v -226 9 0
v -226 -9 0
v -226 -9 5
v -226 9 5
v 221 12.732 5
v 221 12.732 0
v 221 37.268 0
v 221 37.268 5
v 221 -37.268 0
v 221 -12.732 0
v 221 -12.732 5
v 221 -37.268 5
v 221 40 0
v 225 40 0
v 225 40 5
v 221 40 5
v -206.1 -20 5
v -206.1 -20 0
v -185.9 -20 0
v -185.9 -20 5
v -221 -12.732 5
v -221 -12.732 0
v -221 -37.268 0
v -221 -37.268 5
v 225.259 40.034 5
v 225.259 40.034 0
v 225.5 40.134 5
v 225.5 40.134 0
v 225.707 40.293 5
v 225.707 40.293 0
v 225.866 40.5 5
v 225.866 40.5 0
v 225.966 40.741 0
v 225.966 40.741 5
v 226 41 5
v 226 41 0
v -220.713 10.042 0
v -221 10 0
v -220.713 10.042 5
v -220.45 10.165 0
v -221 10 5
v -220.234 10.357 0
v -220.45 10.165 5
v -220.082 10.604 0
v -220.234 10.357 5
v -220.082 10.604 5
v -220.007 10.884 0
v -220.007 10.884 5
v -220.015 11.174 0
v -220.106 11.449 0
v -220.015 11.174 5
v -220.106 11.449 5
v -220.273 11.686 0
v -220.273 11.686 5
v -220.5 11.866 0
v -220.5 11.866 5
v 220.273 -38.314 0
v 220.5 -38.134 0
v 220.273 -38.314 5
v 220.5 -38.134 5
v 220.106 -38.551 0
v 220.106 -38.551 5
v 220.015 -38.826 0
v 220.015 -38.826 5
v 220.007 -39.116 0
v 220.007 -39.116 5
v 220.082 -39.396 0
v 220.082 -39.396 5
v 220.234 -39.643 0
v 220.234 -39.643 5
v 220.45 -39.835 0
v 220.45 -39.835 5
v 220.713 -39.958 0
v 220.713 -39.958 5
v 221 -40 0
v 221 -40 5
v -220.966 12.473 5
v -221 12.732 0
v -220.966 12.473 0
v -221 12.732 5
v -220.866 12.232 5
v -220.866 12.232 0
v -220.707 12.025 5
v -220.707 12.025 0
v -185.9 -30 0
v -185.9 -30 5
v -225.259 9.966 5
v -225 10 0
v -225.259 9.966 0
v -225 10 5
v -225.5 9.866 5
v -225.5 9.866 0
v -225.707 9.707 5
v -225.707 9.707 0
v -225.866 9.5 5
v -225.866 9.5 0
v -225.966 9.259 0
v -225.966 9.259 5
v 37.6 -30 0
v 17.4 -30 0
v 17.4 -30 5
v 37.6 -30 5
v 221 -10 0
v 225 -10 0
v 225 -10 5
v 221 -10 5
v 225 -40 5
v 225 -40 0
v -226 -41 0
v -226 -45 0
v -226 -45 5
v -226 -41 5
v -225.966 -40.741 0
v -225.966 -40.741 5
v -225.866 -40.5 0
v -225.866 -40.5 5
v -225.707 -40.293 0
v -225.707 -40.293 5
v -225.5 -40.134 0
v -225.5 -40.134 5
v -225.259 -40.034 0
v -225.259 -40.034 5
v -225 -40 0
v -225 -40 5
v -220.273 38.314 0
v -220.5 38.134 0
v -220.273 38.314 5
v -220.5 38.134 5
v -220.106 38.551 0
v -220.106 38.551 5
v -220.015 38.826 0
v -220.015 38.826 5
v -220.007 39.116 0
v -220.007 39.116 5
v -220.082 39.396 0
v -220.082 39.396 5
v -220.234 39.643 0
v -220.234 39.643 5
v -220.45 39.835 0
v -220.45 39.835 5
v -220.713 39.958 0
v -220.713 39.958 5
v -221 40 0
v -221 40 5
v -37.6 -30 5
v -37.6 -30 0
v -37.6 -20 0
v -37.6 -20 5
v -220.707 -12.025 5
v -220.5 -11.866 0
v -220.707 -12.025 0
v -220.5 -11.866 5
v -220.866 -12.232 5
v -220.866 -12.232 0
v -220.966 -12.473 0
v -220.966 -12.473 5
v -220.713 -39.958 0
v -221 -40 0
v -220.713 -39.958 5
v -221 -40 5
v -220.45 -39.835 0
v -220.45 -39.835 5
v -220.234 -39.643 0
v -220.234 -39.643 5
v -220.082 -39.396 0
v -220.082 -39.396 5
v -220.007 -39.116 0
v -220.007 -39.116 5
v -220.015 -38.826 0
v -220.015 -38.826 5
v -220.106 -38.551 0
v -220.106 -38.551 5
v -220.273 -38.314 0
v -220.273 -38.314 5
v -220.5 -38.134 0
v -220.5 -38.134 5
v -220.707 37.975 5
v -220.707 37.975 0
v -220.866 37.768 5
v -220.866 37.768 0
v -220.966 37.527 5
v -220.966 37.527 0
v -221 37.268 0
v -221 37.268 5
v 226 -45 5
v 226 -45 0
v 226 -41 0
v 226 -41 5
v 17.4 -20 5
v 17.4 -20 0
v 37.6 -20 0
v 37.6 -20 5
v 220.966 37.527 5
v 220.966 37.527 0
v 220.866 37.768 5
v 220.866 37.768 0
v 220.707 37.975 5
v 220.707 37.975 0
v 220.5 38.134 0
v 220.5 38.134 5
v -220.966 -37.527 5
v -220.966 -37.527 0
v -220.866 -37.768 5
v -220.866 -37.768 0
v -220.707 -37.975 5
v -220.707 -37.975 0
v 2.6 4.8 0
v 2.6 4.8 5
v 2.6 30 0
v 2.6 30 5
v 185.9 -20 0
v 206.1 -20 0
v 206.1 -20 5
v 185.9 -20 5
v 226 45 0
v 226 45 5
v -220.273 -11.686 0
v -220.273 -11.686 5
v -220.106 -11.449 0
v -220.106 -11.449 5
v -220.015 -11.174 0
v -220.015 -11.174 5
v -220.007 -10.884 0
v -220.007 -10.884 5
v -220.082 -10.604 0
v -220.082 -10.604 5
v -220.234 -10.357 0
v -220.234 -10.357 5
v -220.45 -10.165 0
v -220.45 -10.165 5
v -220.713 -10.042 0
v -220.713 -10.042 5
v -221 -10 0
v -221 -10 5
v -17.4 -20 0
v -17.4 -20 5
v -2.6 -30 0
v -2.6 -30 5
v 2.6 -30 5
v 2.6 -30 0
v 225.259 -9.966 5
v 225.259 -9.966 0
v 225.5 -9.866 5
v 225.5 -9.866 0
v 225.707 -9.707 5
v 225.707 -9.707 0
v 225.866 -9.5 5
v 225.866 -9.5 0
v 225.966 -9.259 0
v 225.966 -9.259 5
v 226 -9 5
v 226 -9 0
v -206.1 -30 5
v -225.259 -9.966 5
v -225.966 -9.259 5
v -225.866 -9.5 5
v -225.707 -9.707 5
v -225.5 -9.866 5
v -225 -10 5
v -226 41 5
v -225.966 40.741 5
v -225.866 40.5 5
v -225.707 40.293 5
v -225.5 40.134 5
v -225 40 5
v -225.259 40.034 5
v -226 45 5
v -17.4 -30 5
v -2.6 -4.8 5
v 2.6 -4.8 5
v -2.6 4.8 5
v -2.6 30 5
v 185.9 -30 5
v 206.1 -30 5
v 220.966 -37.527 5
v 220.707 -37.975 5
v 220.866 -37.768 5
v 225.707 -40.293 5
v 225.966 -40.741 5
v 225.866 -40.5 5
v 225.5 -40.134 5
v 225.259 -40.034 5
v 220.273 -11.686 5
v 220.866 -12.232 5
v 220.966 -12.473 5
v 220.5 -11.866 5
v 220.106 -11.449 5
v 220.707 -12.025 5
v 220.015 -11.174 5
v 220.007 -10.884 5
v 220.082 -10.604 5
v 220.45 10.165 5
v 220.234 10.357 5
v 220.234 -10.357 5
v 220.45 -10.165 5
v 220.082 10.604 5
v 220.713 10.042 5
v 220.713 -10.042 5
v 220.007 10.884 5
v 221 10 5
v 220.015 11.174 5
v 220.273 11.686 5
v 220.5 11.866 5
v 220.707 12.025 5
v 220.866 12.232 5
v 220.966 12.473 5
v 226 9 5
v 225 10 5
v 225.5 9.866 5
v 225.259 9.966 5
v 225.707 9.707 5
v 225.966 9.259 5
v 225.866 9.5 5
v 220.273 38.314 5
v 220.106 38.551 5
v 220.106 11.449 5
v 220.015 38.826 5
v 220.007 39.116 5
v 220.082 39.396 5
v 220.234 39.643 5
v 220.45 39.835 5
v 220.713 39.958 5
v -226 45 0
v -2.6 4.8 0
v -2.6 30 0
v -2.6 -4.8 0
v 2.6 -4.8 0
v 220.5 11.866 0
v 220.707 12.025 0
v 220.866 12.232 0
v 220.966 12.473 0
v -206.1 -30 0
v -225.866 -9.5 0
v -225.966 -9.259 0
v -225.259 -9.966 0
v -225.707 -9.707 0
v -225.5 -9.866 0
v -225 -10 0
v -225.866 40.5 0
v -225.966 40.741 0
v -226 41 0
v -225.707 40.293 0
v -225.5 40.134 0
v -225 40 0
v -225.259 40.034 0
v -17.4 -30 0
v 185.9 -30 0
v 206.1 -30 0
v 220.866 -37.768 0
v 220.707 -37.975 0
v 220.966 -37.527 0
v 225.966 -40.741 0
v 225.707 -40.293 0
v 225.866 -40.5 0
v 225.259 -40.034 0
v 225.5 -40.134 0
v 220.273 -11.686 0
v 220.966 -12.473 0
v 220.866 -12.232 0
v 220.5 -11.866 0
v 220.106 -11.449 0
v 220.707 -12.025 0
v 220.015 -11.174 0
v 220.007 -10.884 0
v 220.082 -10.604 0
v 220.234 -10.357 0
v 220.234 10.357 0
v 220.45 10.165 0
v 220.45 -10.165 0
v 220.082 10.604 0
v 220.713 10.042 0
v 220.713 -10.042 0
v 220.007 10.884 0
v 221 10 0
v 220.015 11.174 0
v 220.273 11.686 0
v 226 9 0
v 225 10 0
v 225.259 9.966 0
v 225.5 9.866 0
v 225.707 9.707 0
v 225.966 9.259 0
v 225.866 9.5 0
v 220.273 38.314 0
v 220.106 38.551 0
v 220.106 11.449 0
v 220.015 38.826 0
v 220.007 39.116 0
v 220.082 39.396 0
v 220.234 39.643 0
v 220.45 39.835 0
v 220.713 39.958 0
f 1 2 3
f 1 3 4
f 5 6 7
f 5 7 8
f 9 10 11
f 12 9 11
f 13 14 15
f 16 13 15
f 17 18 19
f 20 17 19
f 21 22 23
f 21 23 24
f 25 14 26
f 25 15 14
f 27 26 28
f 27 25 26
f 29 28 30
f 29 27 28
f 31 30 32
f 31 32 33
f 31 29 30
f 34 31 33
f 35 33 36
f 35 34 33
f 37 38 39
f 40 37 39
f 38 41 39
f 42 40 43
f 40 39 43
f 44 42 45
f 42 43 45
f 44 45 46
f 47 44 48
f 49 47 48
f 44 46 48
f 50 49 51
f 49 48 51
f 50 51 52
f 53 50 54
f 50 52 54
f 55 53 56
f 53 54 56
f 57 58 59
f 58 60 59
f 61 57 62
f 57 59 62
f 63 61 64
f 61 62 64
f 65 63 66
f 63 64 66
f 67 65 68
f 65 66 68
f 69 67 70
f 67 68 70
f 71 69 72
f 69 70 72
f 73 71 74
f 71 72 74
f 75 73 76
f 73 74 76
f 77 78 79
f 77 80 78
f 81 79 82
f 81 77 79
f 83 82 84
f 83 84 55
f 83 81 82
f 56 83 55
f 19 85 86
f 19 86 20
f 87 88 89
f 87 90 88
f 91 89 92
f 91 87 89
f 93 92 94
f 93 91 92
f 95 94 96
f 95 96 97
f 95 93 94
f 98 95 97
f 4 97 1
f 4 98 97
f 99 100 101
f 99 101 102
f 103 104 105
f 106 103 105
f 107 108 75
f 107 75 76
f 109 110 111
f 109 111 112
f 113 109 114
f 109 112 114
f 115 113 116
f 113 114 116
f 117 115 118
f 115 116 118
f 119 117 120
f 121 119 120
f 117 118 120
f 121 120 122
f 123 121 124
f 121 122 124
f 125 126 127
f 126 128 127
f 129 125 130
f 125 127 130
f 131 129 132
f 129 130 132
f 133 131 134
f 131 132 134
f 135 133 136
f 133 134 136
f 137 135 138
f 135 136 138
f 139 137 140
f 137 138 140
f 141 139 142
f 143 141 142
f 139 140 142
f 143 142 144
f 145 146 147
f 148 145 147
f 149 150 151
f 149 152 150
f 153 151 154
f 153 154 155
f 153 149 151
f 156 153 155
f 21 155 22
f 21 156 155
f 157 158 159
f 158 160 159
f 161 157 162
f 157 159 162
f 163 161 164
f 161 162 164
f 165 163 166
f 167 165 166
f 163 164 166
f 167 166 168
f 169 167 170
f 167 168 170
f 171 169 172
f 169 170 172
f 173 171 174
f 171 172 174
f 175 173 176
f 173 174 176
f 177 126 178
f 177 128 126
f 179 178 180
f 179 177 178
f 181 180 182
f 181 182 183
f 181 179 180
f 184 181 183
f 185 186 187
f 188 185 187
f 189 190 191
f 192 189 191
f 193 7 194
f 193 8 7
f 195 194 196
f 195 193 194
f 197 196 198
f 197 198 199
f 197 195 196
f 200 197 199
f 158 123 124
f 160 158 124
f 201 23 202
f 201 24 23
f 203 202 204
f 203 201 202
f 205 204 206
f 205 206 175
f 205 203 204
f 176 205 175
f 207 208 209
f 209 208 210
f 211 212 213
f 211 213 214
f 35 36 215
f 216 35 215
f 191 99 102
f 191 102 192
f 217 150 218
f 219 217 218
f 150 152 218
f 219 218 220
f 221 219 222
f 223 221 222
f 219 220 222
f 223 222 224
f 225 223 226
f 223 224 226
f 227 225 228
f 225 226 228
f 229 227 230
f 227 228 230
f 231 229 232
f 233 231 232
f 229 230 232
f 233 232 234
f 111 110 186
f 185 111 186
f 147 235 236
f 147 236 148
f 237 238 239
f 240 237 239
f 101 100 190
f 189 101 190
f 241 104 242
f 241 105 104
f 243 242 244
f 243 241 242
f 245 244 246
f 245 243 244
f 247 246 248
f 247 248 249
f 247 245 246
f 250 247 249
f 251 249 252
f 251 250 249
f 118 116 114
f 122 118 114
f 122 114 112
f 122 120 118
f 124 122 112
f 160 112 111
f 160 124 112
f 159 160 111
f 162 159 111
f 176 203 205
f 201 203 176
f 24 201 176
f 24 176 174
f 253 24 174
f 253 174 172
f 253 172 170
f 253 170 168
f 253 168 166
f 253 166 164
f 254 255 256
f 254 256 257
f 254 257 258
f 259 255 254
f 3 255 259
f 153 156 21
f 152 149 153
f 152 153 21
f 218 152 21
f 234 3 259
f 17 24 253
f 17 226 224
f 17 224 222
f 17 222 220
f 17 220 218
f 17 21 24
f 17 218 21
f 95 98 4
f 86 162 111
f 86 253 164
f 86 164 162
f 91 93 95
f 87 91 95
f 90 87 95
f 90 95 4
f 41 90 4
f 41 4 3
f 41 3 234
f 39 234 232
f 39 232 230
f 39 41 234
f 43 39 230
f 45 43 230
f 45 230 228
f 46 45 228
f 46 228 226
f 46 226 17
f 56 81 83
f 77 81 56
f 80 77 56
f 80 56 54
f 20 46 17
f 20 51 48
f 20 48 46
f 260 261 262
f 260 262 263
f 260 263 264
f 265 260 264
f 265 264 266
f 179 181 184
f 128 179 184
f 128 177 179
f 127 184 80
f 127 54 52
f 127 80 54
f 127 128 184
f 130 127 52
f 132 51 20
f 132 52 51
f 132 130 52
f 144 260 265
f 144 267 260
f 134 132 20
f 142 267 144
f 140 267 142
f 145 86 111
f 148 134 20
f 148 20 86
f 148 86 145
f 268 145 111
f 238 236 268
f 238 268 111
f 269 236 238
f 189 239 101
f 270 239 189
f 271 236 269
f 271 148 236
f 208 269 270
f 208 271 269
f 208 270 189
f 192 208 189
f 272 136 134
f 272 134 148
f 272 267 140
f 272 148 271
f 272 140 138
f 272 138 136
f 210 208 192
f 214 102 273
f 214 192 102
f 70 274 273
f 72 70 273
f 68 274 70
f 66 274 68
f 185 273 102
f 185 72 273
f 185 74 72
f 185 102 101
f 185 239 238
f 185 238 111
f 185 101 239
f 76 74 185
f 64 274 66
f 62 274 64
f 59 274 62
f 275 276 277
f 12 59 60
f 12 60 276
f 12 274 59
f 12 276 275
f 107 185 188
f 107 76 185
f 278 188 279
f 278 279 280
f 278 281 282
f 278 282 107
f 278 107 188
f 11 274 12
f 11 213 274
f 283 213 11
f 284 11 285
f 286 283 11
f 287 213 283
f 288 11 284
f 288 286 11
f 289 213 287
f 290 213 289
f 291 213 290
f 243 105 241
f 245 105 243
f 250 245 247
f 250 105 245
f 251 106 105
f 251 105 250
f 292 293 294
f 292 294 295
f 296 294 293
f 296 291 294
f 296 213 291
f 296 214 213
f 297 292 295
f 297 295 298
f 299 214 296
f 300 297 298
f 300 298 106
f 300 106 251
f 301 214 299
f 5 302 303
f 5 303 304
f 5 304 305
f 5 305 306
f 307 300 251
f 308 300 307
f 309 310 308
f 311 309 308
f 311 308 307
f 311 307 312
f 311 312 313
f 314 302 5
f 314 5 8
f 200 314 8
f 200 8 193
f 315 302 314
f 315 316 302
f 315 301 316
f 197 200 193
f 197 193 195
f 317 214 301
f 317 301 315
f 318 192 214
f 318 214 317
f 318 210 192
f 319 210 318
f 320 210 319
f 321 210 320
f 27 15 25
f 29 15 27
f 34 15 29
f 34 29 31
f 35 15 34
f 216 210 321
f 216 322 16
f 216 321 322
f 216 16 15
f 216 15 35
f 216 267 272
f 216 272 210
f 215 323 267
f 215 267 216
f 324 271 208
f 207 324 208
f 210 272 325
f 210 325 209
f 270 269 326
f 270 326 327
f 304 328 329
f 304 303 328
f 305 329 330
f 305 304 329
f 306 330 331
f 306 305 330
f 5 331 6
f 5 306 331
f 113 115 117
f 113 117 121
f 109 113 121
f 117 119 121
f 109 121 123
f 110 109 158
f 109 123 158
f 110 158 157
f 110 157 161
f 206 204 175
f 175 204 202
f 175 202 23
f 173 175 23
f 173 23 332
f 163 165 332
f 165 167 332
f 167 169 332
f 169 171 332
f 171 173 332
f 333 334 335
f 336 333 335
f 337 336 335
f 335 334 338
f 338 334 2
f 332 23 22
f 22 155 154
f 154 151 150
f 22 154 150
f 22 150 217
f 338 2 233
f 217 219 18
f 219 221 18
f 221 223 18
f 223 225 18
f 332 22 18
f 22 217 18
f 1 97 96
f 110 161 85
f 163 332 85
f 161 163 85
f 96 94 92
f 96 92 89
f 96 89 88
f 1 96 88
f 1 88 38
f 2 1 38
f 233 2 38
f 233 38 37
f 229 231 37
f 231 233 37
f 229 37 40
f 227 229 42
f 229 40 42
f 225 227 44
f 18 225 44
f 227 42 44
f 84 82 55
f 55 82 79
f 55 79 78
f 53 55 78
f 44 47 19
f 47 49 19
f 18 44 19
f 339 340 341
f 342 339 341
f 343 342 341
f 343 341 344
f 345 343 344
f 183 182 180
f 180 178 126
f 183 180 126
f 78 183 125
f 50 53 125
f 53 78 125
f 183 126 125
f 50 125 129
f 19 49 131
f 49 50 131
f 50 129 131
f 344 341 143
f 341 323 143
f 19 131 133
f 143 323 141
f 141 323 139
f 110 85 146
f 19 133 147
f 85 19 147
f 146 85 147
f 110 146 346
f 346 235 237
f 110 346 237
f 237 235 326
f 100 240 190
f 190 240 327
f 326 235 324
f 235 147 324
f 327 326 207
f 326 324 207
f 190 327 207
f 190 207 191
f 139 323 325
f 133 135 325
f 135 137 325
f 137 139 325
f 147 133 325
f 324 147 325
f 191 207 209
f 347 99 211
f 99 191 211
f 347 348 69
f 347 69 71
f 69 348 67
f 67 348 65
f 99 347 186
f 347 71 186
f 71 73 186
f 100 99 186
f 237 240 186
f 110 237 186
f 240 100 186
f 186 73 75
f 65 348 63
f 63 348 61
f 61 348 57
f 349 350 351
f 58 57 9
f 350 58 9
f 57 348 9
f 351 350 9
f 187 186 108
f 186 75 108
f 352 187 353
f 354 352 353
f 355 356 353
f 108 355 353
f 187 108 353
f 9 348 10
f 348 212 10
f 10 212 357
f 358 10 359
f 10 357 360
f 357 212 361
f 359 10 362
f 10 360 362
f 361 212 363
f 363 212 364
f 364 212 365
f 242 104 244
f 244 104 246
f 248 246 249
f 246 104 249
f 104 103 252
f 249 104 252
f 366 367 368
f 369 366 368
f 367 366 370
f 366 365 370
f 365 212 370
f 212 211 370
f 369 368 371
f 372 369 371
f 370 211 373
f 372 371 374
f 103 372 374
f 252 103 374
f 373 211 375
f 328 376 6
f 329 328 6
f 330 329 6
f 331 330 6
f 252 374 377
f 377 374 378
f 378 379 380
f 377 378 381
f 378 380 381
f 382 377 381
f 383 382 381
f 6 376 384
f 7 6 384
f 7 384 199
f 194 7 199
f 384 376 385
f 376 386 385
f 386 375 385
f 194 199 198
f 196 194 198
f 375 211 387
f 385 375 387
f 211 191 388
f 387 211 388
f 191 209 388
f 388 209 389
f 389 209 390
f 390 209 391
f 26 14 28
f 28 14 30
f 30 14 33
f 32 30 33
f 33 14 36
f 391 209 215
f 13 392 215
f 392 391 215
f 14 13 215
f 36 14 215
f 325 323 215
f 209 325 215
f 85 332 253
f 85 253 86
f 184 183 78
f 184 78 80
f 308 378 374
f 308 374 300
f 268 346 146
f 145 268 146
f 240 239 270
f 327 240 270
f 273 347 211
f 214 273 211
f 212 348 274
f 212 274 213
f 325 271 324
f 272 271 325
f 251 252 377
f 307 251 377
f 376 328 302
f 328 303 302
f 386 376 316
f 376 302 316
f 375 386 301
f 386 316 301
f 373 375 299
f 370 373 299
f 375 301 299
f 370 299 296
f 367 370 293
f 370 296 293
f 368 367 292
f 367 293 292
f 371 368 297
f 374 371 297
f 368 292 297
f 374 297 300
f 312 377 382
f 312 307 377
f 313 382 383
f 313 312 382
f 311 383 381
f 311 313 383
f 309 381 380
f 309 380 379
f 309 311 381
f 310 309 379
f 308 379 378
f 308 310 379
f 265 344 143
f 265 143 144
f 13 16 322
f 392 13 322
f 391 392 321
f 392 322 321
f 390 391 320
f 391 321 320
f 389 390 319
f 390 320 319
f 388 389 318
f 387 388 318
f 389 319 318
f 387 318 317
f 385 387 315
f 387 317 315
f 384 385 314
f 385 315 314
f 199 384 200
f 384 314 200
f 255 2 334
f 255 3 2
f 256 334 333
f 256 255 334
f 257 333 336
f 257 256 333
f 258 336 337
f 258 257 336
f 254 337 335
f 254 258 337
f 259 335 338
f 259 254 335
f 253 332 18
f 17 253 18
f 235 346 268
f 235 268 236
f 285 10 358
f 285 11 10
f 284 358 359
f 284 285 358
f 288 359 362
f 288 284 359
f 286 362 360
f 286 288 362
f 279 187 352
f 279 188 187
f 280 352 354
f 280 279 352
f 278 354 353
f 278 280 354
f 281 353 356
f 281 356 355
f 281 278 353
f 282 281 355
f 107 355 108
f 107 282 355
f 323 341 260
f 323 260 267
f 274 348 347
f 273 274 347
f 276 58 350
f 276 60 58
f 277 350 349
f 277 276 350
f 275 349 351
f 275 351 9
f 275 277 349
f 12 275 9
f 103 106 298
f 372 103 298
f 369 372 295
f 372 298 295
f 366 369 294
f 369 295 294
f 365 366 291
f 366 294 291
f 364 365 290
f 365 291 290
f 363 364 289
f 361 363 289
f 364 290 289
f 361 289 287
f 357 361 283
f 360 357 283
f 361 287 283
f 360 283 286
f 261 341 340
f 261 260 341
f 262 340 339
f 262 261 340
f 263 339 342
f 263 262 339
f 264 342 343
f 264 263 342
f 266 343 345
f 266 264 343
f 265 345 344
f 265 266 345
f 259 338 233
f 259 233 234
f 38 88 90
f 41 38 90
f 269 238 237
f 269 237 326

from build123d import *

# Parameters (mm, degrees)
SKETCH1_W           = 452
SKETCH1_H           = 90
BOSS_EXTRUDE1_DEPTH = 5
SKETCH2_W           = 5.2
SKETCH2_H           = 25.2
CUT_EXTRUDE1_DEPTH  = 231.490780727
SKETCH4_W           = 5
SKETCH4_H           = 30
CUT_EXTRUDE5_DEPTH  = 5
SKETCH7_R           = 1
CUT_EXTRUDE6_DEPTH  = 231.490780727
FILLET4_R           = 1
SKETCH8_W           = 20.2
SKETCH8_H           = 10
CUT_EXTRUDE7_DEPTH  = 10
SKETCH9_W           = 20.2
SKETCH9_H           = 10
CUT_EXTRUDE8_DEPTH  = 300


with BuildPart() as part:
    # Sketch1 → Boss-Extrude1 (new body)
    with BuildSketch(Plane.XY):
        Rectangle(SKETCH1_W, SKETCH1_H)
    extrude(amount=BOSS_EXTRUDE1_DEPTH)

    # Sketch2 → Cut-Extrude1 (cut, through all)
    with BuildSketch(Plane.XY.offset(5)):
        with Locations((0, 17.4)):
            Rectangle(SKETCH2_W, SKETCH2_H)
        with Locations((0, -17.4)):
            Rectangle(SKETCH2_W, SKETCH2_H)
    extrude(amount=-CUT_EXTRUDE1_DEPTH, mode=Mode.SUBTRACT)

    # Sketch4 → Cut-Extrude5 (cut)
    with BuildSketch(Plane.ZY.offset(226)):
        with Locations((2.5, 25)):
            Rectangle(SKETCH4_W, SKETCH4_H)
        with Locations((2.5, -25)):
            Rectangle(SKETCH4_W, SKETCH4_H)
    cut_extrude5 = extrude(amount=-CUT_EXTRUDE5_DEPTH, mode=Mode.SUBTRACT)

    # Mirror2: Cut-Extrude5 across plane
    add(cut_extrude5.mirror(Plane(origin=(0, 0, 0), x_dir=(0, 0, 1), z_dir=(1, 0, 0))), mode=Mode.SUBTRACT)

    # Sketch7 → Cut-Extrude6 (cut, through all)
    with BuildSketch(Plane.XY.offset(5)):
        with Locations((-221, 39)):
            Circle(SKETCH7_R)
        with Locations((-221, 11)):
            Circle(SKETCH7_R)
        with Locations((-221, -11)):
            Circle(SKETCH7_R)
        with Locations((-221, -39)):
            Circle(SKETCH7_R)
        with Locations((221, -39)):
            Circle(SKETCH7_R)
        with Locations((221, -11)):
            Circle(SKETCH7_R)
        with Locations((221, 11)):
            Circle(SKETCH7_R)
        with Locations((221, 39)):
            Circle(SKETCH7_R)
    extrude(amount=-CUT_EXTRUDE6_DEPTH, mode=Mode.SUBTRACT)

    # Fillet4
    fillet4_edges = [part.edges().sort_by_distance(p)[0] for p in [
        (221, 38, 2.5),
        (221, 12, 2.5),
        (221, -12, 2.5),
        (221, -38, 2.5),
        (-221, 38, 2.5),
        (-221, 12, 2.5),
        (-221, -38, 2.5),
        (-221, -12, 2.5),
        (-226, 10, 2.5),
        (-226, 40, 2.5),
        (-226, -40, 2.5),
        (-226, -10, 2.5),
        (226, 10, 2.5),
        (226, 40, 2.5),
        (226, -40, 2.5),
        (226, -10, 2.5),
    ]]
    fillet(fillet4_edges, radius=FILLET4_R)

    # Sketch8 → Cut-Extrude7 (cut)
    with BuildSketch(Plane(origin=(0, -610.456150304, 0), x_dir=(-1, 0, 0), z_dir=(0, 0, -1))):
        with Locations((-196, 585.456150304)):
            Rectangle(SKETCH8_W, SKETCH8_H)
    cut_extrude7 = extrude(amount=-CUT_EXTRUDE7_DEPTH, mode=Mode.SUBTRACT)

    # Mirror3: Cut-Extrude7 across plane
    add(cut_extrude7.mirror(Plane(origin=(0, 0, 0), x_dir=(0, 0, 1), z_dir=(1, 0, 0))), mode=Mode.SUBTRACT)

    # Sketch9 → Cut-Extrude8 (cut)
    with BuildSketch(Plane(origin=(0, -610.456150304, -223.6), x_dir=(-1, 0, 0), z_dir=(0, 0, -1))):
        with Locations((27.5, 585.456150304)):
            Rectangle(SKETCH9_W, SKETCH9_H)
    cut_extrude8 = extrude(amount=-CUT_EXTRUDE8_DEPTH, mode=Mode.SUBTRACT)

    # Mirror4: Cut-Extrude8 across plane
    add(cut_extrude8.mirror(Plane(origin=(0, 0, 0), x_dir=(0, 0, 1), z_dir=(1, 0, 0))), mode=Mode.SUBTRACT)


solid = part.part
